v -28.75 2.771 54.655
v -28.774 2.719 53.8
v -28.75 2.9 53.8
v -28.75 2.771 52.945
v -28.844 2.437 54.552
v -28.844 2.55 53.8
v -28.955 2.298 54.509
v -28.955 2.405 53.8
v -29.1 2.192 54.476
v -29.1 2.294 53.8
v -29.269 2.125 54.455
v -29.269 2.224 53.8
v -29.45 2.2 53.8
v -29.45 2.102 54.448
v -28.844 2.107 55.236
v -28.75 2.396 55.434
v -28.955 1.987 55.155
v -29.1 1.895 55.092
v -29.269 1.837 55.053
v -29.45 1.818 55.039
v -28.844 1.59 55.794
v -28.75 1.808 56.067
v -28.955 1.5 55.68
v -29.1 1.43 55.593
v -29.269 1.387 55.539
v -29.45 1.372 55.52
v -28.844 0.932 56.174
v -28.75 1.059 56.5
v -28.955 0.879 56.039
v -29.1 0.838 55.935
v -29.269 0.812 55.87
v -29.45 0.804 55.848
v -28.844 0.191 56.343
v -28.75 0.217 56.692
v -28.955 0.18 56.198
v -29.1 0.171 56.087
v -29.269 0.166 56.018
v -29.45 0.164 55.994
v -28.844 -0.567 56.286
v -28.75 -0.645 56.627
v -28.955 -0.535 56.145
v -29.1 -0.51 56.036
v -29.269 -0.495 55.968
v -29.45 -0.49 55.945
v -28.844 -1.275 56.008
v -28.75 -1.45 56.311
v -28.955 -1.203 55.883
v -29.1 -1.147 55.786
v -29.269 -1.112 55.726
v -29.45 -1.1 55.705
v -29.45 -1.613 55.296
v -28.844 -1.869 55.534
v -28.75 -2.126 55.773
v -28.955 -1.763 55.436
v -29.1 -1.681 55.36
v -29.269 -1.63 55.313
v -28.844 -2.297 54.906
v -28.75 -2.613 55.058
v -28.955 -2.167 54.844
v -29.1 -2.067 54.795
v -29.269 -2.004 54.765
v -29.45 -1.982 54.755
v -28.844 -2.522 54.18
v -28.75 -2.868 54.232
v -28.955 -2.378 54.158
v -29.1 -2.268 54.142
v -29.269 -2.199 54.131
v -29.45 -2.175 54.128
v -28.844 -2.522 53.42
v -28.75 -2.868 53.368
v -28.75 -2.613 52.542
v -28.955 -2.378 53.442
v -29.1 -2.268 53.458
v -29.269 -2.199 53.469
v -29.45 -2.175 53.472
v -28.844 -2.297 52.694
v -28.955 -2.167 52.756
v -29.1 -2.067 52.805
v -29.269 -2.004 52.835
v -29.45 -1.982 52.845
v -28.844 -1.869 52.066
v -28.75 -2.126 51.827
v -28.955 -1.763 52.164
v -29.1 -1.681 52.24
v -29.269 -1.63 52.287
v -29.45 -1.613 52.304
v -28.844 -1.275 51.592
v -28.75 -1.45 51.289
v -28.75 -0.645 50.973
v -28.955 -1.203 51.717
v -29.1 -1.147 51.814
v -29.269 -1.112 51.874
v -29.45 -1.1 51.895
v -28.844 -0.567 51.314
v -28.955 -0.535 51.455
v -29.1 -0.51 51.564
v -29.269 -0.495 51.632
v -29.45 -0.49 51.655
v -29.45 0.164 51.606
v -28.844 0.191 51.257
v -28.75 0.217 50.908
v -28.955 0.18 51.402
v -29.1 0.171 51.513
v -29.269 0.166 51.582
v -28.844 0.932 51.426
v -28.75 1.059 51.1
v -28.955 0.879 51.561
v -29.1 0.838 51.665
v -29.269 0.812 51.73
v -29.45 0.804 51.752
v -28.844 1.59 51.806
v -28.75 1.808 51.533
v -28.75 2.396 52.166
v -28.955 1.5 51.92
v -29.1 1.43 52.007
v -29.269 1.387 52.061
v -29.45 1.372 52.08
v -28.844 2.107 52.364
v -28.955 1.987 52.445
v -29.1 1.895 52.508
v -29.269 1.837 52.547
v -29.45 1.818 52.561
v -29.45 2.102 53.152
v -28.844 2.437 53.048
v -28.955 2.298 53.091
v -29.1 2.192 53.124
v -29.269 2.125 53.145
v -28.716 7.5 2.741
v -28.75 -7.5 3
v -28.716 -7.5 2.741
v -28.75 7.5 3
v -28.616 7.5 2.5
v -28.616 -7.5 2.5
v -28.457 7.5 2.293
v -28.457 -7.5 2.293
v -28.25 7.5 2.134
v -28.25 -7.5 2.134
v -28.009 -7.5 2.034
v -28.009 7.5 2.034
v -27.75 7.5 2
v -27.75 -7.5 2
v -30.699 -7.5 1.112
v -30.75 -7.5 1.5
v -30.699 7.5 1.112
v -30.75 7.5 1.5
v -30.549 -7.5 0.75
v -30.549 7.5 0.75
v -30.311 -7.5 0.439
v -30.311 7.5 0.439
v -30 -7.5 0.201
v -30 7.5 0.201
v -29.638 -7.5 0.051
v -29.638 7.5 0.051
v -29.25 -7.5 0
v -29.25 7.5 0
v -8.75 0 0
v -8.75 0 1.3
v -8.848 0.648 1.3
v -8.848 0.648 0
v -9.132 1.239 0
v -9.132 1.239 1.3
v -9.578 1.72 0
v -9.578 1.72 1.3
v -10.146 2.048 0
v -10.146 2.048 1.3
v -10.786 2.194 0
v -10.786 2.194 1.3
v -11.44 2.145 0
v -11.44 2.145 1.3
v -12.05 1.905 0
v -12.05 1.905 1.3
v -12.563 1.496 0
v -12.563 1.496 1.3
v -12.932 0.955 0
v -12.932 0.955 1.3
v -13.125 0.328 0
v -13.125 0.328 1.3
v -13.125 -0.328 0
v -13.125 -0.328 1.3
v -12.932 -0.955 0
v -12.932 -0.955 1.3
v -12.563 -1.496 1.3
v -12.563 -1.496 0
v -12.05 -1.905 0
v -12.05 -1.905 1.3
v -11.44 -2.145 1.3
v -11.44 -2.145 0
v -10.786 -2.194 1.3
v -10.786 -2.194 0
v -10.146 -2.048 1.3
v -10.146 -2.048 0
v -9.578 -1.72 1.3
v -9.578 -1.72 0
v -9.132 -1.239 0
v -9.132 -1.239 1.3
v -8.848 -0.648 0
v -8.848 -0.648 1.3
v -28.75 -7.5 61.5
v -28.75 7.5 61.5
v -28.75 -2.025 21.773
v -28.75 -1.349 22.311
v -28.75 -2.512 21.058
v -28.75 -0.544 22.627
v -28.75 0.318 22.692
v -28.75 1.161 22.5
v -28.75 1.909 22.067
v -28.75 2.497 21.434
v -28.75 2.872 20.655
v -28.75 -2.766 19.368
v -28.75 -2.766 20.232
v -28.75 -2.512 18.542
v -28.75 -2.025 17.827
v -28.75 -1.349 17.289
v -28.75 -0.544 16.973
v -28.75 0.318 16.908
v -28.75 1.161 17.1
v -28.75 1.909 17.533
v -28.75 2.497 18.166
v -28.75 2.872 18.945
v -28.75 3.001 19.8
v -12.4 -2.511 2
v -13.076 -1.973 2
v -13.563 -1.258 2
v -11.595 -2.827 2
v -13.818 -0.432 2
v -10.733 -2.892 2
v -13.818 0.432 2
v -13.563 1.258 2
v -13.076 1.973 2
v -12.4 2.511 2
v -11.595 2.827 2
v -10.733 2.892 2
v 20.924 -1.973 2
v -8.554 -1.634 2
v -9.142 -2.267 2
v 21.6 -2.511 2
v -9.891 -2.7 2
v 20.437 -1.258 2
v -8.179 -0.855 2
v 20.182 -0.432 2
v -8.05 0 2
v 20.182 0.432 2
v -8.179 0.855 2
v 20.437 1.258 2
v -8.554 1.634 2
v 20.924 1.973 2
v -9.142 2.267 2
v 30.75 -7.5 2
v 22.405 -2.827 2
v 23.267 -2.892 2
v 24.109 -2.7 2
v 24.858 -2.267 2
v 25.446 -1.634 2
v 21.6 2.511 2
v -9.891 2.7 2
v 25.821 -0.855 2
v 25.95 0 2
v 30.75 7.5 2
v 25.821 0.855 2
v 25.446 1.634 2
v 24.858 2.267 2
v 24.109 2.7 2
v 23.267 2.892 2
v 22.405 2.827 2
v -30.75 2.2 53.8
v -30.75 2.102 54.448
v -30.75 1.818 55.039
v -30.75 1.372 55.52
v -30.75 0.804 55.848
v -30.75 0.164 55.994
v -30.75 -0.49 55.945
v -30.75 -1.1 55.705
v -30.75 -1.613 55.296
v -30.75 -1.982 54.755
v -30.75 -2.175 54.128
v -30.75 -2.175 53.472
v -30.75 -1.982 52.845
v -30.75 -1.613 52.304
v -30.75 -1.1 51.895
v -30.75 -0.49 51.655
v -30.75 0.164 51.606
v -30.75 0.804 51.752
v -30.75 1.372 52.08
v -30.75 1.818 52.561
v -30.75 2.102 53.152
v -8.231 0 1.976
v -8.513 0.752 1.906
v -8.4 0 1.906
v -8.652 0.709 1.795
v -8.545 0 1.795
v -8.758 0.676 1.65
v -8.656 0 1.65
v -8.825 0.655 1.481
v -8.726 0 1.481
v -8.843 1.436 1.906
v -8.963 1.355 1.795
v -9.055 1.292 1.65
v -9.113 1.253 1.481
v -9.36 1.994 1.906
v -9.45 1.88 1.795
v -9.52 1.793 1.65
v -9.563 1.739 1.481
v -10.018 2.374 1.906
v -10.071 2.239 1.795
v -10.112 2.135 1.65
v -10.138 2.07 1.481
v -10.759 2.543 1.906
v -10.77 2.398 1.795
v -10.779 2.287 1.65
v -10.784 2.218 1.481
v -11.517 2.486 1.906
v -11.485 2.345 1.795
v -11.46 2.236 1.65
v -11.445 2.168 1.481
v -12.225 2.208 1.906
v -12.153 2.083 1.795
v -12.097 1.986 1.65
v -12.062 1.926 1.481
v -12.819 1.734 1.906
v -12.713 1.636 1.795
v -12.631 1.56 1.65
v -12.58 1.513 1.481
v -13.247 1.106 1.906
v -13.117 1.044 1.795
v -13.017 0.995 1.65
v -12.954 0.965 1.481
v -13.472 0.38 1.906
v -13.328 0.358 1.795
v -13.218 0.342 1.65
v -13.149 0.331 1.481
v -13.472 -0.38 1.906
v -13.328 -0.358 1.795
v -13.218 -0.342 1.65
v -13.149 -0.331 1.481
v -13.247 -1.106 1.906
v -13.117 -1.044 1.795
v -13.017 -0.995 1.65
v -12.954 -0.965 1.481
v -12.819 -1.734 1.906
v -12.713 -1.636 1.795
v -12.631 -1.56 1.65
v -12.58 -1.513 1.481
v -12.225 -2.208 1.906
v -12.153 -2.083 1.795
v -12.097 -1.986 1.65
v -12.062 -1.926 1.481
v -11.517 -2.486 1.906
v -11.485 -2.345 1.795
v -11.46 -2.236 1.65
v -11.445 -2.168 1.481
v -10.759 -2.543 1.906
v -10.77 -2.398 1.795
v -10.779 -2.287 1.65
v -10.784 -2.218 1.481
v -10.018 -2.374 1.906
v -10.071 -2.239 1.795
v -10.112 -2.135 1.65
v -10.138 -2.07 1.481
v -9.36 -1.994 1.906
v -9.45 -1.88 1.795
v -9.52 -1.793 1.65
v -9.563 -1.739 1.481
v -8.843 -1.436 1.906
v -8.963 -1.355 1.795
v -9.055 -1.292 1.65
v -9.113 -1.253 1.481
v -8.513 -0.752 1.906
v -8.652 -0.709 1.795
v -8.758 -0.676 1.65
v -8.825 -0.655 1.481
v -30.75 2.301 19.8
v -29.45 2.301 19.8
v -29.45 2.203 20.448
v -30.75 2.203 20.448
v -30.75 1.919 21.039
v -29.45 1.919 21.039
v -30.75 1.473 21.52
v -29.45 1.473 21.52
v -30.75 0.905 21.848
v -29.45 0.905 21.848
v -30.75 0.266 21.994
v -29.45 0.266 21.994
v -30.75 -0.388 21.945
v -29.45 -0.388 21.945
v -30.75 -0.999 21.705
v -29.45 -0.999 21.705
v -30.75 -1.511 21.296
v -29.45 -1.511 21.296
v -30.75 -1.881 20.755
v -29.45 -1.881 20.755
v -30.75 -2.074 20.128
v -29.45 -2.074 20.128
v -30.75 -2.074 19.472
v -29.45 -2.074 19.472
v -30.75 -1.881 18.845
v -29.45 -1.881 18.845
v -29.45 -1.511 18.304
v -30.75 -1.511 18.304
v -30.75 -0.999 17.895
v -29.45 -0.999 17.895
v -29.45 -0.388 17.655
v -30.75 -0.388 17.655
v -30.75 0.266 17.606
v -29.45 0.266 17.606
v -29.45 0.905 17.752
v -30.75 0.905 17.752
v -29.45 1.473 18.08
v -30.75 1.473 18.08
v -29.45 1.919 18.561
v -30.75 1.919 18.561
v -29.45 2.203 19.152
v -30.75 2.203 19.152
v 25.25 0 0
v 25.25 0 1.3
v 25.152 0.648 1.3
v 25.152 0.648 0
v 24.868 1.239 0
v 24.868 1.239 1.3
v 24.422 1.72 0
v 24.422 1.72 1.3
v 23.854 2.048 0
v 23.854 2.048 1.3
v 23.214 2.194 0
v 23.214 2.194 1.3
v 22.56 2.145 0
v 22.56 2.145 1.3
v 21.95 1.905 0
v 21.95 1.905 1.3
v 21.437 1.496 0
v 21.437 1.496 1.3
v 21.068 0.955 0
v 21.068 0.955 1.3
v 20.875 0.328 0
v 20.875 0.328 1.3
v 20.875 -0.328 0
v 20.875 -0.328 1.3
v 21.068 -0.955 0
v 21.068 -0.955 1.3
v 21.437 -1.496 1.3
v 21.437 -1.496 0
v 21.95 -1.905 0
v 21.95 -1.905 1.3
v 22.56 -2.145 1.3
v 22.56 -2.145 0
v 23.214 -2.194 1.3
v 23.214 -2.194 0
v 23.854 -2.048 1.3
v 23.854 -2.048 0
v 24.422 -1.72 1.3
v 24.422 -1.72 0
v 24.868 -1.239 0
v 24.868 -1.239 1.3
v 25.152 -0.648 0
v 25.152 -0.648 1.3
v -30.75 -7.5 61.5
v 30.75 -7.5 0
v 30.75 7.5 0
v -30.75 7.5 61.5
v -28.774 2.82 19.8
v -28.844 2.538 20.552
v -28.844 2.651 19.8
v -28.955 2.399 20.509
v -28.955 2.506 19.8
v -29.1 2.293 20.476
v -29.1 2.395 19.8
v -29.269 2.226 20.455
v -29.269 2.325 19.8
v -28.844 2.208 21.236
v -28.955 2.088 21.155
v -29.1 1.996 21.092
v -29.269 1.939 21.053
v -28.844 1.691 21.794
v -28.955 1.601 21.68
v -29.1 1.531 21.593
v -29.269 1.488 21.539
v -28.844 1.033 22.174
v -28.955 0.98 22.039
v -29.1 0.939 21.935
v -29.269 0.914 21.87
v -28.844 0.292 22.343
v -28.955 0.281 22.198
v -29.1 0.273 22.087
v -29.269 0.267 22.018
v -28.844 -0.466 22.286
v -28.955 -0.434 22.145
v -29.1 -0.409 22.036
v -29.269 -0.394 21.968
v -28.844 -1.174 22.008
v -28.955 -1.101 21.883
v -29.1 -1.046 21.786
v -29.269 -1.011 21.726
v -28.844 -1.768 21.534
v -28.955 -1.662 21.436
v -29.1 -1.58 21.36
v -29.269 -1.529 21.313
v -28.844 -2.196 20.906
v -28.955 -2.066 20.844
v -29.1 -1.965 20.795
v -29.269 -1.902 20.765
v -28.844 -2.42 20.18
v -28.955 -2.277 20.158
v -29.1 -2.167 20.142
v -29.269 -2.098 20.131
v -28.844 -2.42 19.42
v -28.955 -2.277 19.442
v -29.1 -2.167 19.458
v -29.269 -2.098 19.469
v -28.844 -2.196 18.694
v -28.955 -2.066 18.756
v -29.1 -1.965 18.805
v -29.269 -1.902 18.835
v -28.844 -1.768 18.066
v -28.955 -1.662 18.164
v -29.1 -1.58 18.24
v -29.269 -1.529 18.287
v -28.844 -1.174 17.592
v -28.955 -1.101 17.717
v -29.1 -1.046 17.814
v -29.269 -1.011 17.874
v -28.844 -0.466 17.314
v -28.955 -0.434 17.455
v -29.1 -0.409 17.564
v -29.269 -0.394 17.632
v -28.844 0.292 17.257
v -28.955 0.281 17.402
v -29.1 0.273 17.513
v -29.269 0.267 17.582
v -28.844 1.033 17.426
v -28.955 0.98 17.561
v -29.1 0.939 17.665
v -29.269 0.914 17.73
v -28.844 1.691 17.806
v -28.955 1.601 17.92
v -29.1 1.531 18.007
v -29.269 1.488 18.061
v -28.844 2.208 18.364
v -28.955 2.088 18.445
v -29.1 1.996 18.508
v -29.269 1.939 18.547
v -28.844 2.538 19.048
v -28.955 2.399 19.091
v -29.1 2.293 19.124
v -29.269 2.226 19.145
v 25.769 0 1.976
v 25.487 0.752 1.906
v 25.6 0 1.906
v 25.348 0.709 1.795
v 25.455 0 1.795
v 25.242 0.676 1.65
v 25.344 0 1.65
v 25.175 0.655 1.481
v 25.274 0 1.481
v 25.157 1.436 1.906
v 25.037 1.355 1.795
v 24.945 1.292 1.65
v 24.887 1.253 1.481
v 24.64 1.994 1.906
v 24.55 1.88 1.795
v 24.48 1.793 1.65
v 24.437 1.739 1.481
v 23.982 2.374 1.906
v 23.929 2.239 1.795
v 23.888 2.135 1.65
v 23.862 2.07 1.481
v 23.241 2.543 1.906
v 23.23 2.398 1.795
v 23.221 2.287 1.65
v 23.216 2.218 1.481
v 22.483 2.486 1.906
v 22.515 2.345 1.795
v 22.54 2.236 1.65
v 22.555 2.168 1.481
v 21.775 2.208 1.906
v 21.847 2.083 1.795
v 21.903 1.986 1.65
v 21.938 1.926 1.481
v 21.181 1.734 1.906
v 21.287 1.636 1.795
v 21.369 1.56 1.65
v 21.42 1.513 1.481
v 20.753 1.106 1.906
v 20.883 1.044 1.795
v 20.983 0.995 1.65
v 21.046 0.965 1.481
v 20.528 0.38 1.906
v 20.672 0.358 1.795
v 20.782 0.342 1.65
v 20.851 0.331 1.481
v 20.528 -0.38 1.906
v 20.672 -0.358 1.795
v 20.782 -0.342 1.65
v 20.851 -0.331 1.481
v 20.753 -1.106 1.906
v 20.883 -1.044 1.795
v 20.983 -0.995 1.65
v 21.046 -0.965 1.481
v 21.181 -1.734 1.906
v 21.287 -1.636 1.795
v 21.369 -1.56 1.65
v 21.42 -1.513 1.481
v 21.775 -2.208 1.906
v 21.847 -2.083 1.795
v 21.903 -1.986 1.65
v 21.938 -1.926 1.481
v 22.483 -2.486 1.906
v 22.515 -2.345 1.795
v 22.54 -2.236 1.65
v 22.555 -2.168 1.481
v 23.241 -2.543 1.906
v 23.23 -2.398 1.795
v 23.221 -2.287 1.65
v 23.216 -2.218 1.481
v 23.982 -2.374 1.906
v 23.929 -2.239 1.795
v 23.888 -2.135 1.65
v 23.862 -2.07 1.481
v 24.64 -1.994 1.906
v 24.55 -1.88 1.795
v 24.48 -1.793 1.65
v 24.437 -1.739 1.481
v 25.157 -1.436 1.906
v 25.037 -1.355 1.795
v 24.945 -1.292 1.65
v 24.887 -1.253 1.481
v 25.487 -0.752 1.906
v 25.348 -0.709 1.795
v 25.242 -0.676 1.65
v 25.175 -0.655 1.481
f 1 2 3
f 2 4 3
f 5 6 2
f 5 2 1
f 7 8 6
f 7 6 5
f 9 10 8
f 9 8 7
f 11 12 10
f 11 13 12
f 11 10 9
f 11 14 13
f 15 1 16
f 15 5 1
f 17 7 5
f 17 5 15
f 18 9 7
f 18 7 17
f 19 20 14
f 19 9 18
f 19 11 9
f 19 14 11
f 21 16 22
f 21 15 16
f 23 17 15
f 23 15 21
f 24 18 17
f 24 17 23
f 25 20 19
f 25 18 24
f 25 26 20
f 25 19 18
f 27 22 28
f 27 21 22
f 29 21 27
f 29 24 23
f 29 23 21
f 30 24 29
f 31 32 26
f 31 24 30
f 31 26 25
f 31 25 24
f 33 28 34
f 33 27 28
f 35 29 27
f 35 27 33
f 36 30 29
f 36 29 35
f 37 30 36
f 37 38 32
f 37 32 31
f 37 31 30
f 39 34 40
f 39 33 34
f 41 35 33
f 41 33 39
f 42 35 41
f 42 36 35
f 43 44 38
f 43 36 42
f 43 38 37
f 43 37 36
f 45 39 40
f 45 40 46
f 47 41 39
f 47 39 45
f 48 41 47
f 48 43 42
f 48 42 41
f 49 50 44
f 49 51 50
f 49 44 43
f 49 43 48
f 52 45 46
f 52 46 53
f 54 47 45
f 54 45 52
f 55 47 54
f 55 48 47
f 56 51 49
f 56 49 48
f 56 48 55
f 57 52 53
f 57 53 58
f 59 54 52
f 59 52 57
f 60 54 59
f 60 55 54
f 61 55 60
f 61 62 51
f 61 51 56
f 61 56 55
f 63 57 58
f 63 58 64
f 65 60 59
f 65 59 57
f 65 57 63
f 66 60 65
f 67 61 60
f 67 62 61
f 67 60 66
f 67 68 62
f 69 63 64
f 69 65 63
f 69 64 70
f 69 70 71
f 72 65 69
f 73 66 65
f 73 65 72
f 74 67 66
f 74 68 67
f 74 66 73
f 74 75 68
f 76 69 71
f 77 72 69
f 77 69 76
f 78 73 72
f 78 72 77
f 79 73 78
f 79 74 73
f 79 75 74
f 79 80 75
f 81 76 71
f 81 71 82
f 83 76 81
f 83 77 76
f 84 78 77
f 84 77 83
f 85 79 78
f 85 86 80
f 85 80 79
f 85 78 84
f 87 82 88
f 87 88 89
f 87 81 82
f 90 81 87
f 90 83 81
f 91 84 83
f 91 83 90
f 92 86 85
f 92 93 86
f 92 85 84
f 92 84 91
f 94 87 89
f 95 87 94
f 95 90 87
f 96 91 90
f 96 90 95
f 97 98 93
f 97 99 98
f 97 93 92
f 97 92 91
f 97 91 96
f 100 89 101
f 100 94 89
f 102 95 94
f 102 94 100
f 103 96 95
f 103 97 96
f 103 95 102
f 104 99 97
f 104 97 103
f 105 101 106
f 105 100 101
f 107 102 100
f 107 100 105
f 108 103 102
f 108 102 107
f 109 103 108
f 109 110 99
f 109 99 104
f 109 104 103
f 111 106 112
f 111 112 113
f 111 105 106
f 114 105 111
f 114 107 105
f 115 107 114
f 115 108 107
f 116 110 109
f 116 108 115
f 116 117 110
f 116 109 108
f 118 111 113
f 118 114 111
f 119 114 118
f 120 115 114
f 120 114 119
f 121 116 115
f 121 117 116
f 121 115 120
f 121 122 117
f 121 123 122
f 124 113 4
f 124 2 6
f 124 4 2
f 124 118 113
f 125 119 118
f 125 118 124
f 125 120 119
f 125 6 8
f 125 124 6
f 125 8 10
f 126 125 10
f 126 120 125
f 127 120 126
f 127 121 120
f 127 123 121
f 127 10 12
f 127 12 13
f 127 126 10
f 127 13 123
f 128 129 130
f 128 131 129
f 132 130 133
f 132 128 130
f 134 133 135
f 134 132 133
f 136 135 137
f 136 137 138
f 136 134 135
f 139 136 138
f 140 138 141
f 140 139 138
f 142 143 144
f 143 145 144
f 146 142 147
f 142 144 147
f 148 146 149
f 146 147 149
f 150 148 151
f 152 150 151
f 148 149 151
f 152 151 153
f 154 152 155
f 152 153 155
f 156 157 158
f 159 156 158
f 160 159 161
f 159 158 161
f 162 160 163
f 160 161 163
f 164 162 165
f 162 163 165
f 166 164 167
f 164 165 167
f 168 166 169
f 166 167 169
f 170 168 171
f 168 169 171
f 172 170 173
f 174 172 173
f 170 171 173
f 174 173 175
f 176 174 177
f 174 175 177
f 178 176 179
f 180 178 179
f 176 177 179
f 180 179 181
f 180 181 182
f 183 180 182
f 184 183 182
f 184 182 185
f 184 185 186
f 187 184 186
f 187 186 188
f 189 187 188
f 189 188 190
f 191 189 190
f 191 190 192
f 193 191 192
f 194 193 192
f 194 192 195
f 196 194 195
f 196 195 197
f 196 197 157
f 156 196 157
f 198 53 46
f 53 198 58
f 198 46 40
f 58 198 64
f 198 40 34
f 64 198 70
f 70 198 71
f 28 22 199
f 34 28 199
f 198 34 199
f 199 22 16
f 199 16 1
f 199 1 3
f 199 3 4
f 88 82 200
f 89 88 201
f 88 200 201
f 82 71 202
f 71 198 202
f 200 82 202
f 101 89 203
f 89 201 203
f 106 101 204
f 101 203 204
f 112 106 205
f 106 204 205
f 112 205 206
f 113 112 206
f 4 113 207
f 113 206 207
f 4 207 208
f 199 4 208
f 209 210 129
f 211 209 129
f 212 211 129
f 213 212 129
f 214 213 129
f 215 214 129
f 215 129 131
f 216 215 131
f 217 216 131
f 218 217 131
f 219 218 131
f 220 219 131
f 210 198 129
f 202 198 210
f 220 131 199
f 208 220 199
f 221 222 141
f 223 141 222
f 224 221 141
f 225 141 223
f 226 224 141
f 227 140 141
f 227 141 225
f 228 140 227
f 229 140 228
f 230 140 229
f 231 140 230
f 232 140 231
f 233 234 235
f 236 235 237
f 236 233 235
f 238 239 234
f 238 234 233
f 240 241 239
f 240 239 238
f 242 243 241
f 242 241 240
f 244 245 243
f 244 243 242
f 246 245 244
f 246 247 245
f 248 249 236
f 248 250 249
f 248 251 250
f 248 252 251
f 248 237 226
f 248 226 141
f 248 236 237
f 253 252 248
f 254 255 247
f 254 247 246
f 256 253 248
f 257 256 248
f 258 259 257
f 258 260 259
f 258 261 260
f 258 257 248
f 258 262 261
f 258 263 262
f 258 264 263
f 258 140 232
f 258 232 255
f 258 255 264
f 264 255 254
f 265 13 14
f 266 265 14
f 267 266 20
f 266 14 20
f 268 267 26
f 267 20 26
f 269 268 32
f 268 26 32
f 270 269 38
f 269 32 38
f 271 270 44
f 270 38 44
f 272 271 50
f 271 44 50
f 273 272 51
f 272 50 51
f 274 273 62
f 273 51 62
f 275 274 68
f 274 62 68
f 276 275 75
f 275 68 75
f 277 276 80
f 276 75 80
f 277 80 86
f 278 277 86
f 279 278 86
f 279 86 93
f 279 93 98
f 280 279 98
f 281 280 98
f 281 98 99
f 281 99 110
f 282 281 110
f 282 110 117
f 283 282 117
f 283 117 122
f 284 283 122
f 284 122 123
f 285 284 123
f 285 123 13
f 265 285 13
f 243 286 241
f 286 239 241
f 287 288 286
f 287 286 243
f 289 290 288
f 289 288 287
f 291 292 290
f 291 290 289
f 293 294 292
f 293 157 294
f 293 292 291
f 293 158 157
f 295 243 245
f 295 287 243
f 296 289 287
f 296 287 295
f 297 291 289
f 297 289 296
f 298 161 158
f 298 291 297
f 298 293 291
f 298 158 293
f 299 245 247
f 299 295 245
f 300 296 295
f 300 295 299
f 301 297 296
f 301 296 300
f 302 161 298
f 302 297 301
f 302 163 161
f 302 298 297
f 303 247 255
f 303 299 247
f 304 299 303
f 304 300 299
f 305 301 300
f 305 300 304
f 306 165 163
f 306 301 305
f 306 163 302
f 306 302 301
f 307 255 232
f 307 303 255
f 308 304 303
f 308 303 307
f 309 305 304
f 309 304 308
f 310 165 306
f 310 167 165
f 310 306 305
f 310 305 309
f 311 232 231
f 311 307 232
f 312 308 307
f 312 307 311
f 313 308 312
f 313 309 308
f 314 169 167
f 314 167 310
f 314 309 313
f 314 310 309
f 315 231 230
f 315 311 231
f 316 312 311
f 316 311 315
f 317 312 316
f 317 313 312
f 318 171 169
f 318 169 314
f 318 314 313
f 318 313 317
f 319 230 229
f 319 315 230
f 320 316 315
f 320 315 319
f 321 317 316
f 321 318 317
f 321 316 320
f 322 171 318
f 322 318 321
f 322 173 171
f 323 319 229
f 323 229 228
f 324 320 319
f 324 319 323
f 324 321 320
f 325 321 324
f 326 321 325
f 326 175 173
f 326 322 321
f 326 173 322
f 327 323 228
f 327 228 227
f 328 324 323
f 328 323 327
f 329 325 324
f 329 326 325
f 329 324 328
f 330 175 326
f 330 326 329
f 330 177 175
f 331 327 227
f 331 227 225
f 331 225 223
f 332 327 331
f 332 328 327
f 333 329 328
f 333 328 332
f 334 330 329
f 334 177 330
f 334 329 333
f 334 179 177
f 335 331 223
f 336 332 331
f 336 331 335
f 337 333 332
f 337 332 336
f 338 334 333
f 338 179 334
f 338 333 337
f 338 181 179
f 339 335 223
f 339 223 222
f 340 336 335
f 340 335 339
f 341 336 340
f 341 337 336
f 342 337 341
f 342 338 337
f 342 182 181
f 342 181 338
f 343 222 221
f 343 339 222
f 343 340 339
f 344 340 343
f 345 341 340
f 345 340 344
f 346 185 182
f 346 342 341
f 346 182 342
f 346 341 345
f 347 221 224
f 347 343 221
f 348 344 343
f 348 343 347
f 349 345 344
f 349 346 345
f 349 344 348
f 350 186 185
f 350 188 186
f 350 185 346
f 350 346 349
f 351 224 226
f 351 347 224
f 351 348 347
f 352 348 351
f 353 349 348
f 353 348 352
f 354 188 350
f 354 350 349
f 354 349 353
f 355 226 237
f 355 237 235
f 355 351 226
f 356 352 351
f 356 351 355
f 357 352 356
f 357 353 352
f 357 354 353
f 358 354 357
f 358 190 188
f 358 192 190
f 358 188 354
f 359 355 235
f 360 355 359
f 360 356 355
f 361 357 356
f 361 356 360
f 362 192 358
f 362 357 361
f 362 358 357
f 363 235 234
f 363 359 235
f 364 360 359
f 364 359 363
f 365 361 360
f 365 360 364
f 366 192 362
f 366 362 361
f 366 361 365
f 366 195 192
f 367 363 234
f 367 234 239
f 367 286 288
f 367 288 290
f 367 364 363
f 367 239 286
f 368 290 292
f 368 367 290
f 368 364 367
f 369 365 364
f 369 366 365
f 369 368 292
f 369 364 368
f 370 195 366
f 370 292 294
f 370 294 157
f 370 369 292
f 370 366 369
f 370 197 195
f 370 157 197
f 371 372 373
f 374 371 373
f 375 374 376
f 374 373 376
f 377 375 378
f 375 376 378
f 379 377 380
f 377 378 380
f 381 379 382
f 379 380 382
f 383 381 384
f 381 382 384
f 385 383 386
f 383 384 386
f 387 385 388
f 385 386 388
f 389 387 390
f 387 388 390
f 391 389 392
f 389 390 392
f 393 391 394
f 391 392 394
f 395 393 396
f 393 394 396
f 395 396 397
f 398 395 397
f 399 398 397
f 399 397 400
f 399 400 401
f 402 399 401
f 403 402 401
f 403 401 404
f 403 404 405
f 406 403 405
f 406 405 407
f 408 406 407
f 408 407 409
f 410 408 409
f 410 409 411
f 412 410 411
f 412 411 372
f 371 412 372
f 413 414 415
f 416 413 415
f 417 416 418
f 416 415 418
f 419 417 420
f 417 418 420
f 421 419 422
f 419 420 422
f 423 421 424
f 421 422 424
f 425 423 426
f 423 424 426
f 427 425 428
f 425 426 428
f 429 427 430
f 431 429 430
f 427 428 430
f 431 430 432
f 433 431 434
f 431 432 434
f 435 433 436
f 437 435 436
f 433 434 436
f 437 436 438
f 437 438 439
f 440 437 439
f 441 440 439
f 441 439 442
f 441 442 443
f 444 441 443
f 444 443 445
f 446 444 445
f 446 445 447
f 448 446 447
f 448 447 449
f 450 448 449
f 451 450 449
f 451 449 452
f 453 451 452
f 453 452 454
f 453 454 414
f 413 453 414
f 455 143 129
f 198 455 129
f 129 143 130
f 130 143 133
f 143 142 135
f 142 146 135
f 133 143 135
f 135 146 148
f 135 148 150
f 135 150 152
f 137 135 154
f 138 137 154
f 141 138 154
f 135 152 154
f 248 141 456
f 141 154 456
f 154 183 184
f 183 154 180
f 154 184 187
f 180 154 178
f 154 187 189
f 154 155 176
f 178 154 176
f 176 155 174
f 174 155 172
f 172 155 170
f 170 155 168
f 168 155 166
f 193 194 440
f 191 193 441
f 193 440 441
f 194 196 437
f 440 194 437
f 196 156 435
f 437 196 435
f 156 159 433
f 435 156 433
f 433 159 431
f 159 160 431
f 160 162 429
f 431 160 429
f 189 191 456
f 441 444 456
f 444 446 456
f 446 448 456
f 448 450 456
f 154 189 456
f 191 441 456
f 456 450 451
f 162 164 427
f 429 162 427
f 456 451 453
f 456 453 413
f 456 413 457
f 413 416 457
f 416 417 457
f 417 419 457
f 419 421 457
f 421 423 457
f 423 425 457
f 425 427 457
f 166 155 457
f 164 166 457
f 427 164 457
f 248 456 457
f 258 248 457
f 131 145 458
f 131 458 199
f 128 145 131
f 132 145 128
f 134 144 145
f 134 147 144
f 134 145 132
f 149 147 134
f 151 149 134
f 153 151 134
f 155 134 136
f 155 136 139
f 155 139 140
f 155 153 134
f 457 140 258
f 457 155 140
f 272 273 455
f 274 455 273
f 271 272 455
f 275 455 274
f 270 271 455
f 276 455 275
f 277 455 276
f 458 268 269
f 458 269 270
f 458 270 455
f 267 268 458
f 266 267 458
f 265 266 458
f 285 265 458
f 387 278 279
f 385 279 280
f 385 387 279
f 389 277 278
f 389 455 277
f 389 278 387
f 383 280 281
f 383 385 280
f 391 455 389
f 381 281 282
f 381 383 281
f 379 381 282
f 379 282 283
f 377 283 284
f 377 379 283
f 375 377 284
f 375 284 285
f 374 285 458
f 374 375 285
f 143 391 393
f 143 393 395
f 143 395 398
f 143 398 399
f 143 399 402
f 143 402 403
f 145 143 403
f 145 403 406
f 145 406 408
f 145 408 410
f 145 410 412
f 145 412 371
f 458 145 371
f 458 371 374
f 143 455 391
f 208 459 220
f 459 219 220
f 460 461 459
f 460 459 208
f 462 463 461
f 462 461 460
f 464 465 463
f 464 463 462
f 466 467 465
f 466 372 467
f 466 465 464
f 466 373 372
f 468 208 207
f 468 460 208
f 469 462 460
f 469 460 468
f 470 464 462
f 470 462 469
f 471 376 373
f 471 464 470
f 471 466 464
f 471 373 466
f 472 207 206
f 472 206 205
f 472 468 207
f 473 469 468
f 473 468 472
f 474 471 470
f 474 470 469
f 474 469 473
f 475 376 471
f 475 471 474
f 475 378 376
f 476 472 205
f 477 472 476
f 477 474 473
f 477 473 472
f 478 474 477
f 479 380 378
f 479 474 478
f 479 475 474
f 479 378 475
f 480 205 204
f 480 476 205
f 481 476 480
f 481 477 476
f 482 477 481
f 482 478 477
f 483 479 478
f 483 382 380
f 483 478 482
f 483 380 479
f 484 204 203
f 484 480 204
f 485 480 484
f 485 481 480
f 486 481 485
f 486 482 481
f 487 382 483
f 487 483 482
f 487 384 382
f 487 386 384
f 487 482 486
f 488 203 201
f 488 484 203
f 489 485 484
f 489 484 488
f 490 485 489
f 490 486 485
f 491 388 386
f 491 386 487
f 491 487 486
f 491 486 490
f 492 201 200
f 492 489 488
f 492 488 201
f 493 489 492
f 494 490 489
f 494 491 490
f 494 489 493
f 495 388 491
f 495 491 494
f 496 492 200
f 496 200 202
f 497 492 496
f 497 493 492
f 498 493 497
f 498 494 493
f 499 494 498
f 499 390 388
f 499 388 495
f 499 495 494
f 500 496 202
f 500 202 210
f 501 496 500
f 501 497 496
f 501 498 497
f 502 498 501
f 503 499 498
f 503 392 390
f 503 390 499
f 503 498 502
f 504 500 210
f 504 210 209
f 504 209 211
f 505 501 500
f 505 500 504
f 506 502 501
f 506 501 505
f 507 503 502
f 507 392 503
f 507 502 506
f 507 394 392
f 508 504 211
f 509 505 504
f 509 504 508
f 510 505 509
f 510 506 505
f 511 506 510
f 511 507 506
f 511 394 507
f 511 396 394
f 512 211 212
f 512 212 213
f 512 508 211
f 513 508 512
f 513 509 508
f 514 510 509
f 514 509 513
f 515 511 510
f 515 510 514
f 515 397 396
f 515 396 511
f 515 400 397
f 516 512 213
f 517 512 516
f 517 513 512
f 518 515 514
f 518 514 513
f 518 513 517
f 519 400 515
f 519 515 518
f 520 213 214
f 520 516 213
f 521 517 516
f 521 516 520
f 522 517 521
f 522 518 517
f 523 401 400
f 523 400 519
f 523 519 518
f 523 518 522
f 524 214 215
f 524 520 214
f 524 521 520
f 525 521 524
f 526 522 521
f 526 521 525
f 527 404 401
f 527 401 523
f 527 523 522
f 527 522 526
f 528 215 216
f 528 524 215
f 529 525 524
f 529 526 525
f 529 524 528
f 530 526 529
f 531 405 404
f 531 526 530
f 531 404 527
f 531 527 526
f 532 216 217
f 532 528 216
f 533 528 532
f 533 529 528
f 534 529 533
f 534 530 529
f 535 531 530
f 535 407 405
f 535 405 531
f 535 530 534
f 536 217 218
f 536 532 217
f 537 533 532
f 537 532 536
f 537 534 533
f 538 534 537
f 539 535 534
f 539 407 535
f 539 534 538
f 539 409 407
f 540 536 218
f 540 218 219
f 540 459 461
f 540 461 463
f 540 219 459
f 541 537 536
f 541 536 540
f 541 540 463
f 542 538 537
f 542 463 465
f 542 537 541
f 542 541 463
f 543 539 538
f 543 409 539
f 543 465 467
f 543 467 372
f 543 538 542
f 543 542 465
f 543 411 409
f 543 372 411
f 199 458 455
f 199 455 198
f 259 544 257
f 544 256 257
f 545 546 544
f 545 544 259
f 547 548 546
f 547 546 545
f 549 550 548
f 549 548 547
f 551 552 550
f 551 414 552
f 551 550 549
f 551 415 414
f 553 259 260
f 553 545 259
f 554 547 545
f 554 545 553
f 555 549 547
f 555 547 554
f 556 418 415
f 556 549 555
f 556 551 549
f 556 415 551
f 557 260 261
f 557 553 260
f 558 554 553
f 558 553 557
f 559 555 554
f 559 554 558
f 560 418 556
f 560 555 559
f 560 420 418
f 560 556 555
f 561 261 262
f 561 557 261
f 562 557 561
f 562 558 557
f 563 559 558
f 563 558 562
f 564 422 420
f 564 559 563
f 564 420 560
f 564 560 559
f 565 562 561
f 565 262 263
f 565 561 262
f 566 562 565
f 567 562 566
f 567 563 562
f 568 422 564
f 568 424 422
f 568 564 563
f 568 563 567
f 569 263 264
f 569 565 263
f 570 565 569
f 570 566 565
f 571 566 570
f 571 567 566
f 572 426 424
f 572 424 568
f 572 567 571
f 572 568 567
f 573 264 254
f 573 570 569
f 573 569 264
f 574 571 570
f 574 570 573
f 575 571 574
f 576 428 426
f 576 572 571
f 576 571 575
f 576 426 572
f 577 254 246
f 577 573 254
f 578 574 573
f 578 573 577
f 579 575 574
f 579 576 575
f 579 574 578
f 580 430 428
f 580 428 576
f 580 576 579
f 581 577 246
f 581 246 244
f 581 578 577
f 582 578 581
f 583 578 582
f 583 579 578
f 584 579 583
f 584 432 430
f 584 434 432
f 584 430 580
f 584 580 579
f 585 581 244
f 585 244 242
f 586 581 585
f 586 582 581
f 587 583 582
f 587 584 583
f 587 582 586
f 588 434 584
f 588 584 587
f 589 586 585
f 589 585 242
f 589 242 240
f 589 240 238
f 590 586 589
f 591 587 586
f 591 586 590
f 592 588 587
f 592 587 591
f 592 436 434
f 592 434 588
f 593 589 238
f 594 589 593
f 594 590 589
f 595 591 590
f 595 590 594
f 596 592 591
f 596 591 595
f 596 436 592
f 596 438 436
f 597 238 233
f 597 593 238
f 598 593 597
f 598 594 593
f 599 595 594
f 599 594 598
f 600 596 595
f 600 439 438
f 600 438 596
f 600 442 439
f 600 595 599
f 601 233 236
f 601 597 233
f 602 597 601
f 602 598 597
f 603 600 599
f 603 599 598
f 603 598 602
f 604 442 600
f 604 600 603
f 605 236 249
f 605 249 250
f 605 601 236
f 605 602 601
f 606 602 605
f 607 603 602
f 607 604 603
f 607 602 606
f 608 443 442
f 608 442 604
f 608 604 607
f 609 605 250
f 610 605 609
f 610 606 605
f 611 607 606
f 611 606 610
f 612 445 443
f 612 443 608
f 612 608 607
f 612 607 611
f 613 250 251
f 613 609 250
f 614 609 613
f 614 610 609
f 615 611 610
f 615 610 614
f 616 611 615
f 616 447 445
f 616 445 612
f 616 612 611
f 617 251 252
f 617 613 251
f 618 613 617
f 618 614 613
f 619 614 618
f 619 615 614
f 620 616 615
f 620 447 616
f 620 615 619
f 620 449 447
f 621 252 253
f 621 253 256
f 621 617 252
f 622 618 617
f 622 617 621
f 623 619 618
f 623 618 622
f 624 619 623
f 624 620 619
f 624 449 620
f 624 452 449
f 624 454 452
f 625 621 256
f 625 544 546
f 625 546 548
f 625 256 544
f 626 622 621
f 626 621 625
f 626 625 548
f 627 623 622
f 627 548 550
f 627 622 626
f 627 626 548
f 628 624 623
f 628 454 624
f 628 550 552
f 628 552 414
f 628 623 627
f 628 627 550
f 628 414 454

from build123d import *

# Parameters (mm, degrees)
SKETCH_W        = 61.5
SKETCH_H        = 15
PAD_DEPTH       = 2
SKETCH001_W     = 2
SKETCH001_H     = 15
PAD001_DEPTH    = 59.5
FILLET_R        = 1.5
FILLET001_R     = 1
SKETCH002_R     = 2.2
POCKET_DEPTH    = 2.001
FILLET002_R     = 0.7
SKETCH003_R     = 2.2
POCKET001_DEPTH = 2.001
FILLET003_R     = 0.7


with BuildPart() as part:
    # Sketch → Pad (new body)
    with BuildSketch(Plane.XY):
        Rectangle(SKETCH_W, SKETCH_H)
    extrude(amount=PAD_DEPTH)

    # Sketch001 (on Face6 of Pad) → Pad001 (join)
    with BuildSketch(Plane.XY.offset(2)):
        with Locations((-29.75, 0)):
            Rectangle(SKETCH001_W, SKETCH001_H)
    extrude(amount=PAD001_DEPTH)

    # Fillet
    fillet_edges = [part.edges().sort_by_distance(p)[0] for p in [
        (-30.75, 0, 0),
    ]]
    fillet(fillet_edges, radius=FILLET_R)

    # Fillet001
    fillet001_edges = [part.edges().sort_by_distance(p)[0] for p in [
        (-28.75, 0, 2),
    ]]
    fillet(fillet001_edges, radius=FILLET001_R)

    # Sketch002 (on Face2 of Fillet001) → Pocket (cut, through all)
    with BuildSketch(Plane.XY.offset(2)):
        with Locations((23.05, 0)):
            Circle(SKETCH002_R)
        with Locations((-10.95, 0)):
            Circle(SKETCH002_R)
    extrude(amount=-POCKET_DEPTH, mode=Mode.SUBTRACT)

    # Fillet002
    fillet002_edges = [part.edges().sort_by_distance(p)[0] for p in [
        (20.85, 0, 2),
        (-13.15, 0, 2),
    ]]
    fillet(fillet002_edges, radius=FILLET002_R)

    # Sketch003 (on Face14 of Fillet002) → Pocket001 (cut, through all)
    with BuildSketch(Plane.YZ.offset(-28.75)):
        with Locations((0, 53.8)):
            Circle(SKETCH003_R)
        with Locations((0.10123, 19.8)):
            Circle(SKETCH003_R)
    extrude(amount=-POCKET001_DEPTH, mode=Mode.SUBTRACT)

    # Fillet003
    fillet003_edges = [part.edges().sort_by_distance(p)[0] for p in [
        (-28.75, -2.2, 53.8),
        (-28.75, -2.09877, 19.8),
    ]]
    fillet(fillet003_edges, radius=FILLET003_R)


solid = part.part
